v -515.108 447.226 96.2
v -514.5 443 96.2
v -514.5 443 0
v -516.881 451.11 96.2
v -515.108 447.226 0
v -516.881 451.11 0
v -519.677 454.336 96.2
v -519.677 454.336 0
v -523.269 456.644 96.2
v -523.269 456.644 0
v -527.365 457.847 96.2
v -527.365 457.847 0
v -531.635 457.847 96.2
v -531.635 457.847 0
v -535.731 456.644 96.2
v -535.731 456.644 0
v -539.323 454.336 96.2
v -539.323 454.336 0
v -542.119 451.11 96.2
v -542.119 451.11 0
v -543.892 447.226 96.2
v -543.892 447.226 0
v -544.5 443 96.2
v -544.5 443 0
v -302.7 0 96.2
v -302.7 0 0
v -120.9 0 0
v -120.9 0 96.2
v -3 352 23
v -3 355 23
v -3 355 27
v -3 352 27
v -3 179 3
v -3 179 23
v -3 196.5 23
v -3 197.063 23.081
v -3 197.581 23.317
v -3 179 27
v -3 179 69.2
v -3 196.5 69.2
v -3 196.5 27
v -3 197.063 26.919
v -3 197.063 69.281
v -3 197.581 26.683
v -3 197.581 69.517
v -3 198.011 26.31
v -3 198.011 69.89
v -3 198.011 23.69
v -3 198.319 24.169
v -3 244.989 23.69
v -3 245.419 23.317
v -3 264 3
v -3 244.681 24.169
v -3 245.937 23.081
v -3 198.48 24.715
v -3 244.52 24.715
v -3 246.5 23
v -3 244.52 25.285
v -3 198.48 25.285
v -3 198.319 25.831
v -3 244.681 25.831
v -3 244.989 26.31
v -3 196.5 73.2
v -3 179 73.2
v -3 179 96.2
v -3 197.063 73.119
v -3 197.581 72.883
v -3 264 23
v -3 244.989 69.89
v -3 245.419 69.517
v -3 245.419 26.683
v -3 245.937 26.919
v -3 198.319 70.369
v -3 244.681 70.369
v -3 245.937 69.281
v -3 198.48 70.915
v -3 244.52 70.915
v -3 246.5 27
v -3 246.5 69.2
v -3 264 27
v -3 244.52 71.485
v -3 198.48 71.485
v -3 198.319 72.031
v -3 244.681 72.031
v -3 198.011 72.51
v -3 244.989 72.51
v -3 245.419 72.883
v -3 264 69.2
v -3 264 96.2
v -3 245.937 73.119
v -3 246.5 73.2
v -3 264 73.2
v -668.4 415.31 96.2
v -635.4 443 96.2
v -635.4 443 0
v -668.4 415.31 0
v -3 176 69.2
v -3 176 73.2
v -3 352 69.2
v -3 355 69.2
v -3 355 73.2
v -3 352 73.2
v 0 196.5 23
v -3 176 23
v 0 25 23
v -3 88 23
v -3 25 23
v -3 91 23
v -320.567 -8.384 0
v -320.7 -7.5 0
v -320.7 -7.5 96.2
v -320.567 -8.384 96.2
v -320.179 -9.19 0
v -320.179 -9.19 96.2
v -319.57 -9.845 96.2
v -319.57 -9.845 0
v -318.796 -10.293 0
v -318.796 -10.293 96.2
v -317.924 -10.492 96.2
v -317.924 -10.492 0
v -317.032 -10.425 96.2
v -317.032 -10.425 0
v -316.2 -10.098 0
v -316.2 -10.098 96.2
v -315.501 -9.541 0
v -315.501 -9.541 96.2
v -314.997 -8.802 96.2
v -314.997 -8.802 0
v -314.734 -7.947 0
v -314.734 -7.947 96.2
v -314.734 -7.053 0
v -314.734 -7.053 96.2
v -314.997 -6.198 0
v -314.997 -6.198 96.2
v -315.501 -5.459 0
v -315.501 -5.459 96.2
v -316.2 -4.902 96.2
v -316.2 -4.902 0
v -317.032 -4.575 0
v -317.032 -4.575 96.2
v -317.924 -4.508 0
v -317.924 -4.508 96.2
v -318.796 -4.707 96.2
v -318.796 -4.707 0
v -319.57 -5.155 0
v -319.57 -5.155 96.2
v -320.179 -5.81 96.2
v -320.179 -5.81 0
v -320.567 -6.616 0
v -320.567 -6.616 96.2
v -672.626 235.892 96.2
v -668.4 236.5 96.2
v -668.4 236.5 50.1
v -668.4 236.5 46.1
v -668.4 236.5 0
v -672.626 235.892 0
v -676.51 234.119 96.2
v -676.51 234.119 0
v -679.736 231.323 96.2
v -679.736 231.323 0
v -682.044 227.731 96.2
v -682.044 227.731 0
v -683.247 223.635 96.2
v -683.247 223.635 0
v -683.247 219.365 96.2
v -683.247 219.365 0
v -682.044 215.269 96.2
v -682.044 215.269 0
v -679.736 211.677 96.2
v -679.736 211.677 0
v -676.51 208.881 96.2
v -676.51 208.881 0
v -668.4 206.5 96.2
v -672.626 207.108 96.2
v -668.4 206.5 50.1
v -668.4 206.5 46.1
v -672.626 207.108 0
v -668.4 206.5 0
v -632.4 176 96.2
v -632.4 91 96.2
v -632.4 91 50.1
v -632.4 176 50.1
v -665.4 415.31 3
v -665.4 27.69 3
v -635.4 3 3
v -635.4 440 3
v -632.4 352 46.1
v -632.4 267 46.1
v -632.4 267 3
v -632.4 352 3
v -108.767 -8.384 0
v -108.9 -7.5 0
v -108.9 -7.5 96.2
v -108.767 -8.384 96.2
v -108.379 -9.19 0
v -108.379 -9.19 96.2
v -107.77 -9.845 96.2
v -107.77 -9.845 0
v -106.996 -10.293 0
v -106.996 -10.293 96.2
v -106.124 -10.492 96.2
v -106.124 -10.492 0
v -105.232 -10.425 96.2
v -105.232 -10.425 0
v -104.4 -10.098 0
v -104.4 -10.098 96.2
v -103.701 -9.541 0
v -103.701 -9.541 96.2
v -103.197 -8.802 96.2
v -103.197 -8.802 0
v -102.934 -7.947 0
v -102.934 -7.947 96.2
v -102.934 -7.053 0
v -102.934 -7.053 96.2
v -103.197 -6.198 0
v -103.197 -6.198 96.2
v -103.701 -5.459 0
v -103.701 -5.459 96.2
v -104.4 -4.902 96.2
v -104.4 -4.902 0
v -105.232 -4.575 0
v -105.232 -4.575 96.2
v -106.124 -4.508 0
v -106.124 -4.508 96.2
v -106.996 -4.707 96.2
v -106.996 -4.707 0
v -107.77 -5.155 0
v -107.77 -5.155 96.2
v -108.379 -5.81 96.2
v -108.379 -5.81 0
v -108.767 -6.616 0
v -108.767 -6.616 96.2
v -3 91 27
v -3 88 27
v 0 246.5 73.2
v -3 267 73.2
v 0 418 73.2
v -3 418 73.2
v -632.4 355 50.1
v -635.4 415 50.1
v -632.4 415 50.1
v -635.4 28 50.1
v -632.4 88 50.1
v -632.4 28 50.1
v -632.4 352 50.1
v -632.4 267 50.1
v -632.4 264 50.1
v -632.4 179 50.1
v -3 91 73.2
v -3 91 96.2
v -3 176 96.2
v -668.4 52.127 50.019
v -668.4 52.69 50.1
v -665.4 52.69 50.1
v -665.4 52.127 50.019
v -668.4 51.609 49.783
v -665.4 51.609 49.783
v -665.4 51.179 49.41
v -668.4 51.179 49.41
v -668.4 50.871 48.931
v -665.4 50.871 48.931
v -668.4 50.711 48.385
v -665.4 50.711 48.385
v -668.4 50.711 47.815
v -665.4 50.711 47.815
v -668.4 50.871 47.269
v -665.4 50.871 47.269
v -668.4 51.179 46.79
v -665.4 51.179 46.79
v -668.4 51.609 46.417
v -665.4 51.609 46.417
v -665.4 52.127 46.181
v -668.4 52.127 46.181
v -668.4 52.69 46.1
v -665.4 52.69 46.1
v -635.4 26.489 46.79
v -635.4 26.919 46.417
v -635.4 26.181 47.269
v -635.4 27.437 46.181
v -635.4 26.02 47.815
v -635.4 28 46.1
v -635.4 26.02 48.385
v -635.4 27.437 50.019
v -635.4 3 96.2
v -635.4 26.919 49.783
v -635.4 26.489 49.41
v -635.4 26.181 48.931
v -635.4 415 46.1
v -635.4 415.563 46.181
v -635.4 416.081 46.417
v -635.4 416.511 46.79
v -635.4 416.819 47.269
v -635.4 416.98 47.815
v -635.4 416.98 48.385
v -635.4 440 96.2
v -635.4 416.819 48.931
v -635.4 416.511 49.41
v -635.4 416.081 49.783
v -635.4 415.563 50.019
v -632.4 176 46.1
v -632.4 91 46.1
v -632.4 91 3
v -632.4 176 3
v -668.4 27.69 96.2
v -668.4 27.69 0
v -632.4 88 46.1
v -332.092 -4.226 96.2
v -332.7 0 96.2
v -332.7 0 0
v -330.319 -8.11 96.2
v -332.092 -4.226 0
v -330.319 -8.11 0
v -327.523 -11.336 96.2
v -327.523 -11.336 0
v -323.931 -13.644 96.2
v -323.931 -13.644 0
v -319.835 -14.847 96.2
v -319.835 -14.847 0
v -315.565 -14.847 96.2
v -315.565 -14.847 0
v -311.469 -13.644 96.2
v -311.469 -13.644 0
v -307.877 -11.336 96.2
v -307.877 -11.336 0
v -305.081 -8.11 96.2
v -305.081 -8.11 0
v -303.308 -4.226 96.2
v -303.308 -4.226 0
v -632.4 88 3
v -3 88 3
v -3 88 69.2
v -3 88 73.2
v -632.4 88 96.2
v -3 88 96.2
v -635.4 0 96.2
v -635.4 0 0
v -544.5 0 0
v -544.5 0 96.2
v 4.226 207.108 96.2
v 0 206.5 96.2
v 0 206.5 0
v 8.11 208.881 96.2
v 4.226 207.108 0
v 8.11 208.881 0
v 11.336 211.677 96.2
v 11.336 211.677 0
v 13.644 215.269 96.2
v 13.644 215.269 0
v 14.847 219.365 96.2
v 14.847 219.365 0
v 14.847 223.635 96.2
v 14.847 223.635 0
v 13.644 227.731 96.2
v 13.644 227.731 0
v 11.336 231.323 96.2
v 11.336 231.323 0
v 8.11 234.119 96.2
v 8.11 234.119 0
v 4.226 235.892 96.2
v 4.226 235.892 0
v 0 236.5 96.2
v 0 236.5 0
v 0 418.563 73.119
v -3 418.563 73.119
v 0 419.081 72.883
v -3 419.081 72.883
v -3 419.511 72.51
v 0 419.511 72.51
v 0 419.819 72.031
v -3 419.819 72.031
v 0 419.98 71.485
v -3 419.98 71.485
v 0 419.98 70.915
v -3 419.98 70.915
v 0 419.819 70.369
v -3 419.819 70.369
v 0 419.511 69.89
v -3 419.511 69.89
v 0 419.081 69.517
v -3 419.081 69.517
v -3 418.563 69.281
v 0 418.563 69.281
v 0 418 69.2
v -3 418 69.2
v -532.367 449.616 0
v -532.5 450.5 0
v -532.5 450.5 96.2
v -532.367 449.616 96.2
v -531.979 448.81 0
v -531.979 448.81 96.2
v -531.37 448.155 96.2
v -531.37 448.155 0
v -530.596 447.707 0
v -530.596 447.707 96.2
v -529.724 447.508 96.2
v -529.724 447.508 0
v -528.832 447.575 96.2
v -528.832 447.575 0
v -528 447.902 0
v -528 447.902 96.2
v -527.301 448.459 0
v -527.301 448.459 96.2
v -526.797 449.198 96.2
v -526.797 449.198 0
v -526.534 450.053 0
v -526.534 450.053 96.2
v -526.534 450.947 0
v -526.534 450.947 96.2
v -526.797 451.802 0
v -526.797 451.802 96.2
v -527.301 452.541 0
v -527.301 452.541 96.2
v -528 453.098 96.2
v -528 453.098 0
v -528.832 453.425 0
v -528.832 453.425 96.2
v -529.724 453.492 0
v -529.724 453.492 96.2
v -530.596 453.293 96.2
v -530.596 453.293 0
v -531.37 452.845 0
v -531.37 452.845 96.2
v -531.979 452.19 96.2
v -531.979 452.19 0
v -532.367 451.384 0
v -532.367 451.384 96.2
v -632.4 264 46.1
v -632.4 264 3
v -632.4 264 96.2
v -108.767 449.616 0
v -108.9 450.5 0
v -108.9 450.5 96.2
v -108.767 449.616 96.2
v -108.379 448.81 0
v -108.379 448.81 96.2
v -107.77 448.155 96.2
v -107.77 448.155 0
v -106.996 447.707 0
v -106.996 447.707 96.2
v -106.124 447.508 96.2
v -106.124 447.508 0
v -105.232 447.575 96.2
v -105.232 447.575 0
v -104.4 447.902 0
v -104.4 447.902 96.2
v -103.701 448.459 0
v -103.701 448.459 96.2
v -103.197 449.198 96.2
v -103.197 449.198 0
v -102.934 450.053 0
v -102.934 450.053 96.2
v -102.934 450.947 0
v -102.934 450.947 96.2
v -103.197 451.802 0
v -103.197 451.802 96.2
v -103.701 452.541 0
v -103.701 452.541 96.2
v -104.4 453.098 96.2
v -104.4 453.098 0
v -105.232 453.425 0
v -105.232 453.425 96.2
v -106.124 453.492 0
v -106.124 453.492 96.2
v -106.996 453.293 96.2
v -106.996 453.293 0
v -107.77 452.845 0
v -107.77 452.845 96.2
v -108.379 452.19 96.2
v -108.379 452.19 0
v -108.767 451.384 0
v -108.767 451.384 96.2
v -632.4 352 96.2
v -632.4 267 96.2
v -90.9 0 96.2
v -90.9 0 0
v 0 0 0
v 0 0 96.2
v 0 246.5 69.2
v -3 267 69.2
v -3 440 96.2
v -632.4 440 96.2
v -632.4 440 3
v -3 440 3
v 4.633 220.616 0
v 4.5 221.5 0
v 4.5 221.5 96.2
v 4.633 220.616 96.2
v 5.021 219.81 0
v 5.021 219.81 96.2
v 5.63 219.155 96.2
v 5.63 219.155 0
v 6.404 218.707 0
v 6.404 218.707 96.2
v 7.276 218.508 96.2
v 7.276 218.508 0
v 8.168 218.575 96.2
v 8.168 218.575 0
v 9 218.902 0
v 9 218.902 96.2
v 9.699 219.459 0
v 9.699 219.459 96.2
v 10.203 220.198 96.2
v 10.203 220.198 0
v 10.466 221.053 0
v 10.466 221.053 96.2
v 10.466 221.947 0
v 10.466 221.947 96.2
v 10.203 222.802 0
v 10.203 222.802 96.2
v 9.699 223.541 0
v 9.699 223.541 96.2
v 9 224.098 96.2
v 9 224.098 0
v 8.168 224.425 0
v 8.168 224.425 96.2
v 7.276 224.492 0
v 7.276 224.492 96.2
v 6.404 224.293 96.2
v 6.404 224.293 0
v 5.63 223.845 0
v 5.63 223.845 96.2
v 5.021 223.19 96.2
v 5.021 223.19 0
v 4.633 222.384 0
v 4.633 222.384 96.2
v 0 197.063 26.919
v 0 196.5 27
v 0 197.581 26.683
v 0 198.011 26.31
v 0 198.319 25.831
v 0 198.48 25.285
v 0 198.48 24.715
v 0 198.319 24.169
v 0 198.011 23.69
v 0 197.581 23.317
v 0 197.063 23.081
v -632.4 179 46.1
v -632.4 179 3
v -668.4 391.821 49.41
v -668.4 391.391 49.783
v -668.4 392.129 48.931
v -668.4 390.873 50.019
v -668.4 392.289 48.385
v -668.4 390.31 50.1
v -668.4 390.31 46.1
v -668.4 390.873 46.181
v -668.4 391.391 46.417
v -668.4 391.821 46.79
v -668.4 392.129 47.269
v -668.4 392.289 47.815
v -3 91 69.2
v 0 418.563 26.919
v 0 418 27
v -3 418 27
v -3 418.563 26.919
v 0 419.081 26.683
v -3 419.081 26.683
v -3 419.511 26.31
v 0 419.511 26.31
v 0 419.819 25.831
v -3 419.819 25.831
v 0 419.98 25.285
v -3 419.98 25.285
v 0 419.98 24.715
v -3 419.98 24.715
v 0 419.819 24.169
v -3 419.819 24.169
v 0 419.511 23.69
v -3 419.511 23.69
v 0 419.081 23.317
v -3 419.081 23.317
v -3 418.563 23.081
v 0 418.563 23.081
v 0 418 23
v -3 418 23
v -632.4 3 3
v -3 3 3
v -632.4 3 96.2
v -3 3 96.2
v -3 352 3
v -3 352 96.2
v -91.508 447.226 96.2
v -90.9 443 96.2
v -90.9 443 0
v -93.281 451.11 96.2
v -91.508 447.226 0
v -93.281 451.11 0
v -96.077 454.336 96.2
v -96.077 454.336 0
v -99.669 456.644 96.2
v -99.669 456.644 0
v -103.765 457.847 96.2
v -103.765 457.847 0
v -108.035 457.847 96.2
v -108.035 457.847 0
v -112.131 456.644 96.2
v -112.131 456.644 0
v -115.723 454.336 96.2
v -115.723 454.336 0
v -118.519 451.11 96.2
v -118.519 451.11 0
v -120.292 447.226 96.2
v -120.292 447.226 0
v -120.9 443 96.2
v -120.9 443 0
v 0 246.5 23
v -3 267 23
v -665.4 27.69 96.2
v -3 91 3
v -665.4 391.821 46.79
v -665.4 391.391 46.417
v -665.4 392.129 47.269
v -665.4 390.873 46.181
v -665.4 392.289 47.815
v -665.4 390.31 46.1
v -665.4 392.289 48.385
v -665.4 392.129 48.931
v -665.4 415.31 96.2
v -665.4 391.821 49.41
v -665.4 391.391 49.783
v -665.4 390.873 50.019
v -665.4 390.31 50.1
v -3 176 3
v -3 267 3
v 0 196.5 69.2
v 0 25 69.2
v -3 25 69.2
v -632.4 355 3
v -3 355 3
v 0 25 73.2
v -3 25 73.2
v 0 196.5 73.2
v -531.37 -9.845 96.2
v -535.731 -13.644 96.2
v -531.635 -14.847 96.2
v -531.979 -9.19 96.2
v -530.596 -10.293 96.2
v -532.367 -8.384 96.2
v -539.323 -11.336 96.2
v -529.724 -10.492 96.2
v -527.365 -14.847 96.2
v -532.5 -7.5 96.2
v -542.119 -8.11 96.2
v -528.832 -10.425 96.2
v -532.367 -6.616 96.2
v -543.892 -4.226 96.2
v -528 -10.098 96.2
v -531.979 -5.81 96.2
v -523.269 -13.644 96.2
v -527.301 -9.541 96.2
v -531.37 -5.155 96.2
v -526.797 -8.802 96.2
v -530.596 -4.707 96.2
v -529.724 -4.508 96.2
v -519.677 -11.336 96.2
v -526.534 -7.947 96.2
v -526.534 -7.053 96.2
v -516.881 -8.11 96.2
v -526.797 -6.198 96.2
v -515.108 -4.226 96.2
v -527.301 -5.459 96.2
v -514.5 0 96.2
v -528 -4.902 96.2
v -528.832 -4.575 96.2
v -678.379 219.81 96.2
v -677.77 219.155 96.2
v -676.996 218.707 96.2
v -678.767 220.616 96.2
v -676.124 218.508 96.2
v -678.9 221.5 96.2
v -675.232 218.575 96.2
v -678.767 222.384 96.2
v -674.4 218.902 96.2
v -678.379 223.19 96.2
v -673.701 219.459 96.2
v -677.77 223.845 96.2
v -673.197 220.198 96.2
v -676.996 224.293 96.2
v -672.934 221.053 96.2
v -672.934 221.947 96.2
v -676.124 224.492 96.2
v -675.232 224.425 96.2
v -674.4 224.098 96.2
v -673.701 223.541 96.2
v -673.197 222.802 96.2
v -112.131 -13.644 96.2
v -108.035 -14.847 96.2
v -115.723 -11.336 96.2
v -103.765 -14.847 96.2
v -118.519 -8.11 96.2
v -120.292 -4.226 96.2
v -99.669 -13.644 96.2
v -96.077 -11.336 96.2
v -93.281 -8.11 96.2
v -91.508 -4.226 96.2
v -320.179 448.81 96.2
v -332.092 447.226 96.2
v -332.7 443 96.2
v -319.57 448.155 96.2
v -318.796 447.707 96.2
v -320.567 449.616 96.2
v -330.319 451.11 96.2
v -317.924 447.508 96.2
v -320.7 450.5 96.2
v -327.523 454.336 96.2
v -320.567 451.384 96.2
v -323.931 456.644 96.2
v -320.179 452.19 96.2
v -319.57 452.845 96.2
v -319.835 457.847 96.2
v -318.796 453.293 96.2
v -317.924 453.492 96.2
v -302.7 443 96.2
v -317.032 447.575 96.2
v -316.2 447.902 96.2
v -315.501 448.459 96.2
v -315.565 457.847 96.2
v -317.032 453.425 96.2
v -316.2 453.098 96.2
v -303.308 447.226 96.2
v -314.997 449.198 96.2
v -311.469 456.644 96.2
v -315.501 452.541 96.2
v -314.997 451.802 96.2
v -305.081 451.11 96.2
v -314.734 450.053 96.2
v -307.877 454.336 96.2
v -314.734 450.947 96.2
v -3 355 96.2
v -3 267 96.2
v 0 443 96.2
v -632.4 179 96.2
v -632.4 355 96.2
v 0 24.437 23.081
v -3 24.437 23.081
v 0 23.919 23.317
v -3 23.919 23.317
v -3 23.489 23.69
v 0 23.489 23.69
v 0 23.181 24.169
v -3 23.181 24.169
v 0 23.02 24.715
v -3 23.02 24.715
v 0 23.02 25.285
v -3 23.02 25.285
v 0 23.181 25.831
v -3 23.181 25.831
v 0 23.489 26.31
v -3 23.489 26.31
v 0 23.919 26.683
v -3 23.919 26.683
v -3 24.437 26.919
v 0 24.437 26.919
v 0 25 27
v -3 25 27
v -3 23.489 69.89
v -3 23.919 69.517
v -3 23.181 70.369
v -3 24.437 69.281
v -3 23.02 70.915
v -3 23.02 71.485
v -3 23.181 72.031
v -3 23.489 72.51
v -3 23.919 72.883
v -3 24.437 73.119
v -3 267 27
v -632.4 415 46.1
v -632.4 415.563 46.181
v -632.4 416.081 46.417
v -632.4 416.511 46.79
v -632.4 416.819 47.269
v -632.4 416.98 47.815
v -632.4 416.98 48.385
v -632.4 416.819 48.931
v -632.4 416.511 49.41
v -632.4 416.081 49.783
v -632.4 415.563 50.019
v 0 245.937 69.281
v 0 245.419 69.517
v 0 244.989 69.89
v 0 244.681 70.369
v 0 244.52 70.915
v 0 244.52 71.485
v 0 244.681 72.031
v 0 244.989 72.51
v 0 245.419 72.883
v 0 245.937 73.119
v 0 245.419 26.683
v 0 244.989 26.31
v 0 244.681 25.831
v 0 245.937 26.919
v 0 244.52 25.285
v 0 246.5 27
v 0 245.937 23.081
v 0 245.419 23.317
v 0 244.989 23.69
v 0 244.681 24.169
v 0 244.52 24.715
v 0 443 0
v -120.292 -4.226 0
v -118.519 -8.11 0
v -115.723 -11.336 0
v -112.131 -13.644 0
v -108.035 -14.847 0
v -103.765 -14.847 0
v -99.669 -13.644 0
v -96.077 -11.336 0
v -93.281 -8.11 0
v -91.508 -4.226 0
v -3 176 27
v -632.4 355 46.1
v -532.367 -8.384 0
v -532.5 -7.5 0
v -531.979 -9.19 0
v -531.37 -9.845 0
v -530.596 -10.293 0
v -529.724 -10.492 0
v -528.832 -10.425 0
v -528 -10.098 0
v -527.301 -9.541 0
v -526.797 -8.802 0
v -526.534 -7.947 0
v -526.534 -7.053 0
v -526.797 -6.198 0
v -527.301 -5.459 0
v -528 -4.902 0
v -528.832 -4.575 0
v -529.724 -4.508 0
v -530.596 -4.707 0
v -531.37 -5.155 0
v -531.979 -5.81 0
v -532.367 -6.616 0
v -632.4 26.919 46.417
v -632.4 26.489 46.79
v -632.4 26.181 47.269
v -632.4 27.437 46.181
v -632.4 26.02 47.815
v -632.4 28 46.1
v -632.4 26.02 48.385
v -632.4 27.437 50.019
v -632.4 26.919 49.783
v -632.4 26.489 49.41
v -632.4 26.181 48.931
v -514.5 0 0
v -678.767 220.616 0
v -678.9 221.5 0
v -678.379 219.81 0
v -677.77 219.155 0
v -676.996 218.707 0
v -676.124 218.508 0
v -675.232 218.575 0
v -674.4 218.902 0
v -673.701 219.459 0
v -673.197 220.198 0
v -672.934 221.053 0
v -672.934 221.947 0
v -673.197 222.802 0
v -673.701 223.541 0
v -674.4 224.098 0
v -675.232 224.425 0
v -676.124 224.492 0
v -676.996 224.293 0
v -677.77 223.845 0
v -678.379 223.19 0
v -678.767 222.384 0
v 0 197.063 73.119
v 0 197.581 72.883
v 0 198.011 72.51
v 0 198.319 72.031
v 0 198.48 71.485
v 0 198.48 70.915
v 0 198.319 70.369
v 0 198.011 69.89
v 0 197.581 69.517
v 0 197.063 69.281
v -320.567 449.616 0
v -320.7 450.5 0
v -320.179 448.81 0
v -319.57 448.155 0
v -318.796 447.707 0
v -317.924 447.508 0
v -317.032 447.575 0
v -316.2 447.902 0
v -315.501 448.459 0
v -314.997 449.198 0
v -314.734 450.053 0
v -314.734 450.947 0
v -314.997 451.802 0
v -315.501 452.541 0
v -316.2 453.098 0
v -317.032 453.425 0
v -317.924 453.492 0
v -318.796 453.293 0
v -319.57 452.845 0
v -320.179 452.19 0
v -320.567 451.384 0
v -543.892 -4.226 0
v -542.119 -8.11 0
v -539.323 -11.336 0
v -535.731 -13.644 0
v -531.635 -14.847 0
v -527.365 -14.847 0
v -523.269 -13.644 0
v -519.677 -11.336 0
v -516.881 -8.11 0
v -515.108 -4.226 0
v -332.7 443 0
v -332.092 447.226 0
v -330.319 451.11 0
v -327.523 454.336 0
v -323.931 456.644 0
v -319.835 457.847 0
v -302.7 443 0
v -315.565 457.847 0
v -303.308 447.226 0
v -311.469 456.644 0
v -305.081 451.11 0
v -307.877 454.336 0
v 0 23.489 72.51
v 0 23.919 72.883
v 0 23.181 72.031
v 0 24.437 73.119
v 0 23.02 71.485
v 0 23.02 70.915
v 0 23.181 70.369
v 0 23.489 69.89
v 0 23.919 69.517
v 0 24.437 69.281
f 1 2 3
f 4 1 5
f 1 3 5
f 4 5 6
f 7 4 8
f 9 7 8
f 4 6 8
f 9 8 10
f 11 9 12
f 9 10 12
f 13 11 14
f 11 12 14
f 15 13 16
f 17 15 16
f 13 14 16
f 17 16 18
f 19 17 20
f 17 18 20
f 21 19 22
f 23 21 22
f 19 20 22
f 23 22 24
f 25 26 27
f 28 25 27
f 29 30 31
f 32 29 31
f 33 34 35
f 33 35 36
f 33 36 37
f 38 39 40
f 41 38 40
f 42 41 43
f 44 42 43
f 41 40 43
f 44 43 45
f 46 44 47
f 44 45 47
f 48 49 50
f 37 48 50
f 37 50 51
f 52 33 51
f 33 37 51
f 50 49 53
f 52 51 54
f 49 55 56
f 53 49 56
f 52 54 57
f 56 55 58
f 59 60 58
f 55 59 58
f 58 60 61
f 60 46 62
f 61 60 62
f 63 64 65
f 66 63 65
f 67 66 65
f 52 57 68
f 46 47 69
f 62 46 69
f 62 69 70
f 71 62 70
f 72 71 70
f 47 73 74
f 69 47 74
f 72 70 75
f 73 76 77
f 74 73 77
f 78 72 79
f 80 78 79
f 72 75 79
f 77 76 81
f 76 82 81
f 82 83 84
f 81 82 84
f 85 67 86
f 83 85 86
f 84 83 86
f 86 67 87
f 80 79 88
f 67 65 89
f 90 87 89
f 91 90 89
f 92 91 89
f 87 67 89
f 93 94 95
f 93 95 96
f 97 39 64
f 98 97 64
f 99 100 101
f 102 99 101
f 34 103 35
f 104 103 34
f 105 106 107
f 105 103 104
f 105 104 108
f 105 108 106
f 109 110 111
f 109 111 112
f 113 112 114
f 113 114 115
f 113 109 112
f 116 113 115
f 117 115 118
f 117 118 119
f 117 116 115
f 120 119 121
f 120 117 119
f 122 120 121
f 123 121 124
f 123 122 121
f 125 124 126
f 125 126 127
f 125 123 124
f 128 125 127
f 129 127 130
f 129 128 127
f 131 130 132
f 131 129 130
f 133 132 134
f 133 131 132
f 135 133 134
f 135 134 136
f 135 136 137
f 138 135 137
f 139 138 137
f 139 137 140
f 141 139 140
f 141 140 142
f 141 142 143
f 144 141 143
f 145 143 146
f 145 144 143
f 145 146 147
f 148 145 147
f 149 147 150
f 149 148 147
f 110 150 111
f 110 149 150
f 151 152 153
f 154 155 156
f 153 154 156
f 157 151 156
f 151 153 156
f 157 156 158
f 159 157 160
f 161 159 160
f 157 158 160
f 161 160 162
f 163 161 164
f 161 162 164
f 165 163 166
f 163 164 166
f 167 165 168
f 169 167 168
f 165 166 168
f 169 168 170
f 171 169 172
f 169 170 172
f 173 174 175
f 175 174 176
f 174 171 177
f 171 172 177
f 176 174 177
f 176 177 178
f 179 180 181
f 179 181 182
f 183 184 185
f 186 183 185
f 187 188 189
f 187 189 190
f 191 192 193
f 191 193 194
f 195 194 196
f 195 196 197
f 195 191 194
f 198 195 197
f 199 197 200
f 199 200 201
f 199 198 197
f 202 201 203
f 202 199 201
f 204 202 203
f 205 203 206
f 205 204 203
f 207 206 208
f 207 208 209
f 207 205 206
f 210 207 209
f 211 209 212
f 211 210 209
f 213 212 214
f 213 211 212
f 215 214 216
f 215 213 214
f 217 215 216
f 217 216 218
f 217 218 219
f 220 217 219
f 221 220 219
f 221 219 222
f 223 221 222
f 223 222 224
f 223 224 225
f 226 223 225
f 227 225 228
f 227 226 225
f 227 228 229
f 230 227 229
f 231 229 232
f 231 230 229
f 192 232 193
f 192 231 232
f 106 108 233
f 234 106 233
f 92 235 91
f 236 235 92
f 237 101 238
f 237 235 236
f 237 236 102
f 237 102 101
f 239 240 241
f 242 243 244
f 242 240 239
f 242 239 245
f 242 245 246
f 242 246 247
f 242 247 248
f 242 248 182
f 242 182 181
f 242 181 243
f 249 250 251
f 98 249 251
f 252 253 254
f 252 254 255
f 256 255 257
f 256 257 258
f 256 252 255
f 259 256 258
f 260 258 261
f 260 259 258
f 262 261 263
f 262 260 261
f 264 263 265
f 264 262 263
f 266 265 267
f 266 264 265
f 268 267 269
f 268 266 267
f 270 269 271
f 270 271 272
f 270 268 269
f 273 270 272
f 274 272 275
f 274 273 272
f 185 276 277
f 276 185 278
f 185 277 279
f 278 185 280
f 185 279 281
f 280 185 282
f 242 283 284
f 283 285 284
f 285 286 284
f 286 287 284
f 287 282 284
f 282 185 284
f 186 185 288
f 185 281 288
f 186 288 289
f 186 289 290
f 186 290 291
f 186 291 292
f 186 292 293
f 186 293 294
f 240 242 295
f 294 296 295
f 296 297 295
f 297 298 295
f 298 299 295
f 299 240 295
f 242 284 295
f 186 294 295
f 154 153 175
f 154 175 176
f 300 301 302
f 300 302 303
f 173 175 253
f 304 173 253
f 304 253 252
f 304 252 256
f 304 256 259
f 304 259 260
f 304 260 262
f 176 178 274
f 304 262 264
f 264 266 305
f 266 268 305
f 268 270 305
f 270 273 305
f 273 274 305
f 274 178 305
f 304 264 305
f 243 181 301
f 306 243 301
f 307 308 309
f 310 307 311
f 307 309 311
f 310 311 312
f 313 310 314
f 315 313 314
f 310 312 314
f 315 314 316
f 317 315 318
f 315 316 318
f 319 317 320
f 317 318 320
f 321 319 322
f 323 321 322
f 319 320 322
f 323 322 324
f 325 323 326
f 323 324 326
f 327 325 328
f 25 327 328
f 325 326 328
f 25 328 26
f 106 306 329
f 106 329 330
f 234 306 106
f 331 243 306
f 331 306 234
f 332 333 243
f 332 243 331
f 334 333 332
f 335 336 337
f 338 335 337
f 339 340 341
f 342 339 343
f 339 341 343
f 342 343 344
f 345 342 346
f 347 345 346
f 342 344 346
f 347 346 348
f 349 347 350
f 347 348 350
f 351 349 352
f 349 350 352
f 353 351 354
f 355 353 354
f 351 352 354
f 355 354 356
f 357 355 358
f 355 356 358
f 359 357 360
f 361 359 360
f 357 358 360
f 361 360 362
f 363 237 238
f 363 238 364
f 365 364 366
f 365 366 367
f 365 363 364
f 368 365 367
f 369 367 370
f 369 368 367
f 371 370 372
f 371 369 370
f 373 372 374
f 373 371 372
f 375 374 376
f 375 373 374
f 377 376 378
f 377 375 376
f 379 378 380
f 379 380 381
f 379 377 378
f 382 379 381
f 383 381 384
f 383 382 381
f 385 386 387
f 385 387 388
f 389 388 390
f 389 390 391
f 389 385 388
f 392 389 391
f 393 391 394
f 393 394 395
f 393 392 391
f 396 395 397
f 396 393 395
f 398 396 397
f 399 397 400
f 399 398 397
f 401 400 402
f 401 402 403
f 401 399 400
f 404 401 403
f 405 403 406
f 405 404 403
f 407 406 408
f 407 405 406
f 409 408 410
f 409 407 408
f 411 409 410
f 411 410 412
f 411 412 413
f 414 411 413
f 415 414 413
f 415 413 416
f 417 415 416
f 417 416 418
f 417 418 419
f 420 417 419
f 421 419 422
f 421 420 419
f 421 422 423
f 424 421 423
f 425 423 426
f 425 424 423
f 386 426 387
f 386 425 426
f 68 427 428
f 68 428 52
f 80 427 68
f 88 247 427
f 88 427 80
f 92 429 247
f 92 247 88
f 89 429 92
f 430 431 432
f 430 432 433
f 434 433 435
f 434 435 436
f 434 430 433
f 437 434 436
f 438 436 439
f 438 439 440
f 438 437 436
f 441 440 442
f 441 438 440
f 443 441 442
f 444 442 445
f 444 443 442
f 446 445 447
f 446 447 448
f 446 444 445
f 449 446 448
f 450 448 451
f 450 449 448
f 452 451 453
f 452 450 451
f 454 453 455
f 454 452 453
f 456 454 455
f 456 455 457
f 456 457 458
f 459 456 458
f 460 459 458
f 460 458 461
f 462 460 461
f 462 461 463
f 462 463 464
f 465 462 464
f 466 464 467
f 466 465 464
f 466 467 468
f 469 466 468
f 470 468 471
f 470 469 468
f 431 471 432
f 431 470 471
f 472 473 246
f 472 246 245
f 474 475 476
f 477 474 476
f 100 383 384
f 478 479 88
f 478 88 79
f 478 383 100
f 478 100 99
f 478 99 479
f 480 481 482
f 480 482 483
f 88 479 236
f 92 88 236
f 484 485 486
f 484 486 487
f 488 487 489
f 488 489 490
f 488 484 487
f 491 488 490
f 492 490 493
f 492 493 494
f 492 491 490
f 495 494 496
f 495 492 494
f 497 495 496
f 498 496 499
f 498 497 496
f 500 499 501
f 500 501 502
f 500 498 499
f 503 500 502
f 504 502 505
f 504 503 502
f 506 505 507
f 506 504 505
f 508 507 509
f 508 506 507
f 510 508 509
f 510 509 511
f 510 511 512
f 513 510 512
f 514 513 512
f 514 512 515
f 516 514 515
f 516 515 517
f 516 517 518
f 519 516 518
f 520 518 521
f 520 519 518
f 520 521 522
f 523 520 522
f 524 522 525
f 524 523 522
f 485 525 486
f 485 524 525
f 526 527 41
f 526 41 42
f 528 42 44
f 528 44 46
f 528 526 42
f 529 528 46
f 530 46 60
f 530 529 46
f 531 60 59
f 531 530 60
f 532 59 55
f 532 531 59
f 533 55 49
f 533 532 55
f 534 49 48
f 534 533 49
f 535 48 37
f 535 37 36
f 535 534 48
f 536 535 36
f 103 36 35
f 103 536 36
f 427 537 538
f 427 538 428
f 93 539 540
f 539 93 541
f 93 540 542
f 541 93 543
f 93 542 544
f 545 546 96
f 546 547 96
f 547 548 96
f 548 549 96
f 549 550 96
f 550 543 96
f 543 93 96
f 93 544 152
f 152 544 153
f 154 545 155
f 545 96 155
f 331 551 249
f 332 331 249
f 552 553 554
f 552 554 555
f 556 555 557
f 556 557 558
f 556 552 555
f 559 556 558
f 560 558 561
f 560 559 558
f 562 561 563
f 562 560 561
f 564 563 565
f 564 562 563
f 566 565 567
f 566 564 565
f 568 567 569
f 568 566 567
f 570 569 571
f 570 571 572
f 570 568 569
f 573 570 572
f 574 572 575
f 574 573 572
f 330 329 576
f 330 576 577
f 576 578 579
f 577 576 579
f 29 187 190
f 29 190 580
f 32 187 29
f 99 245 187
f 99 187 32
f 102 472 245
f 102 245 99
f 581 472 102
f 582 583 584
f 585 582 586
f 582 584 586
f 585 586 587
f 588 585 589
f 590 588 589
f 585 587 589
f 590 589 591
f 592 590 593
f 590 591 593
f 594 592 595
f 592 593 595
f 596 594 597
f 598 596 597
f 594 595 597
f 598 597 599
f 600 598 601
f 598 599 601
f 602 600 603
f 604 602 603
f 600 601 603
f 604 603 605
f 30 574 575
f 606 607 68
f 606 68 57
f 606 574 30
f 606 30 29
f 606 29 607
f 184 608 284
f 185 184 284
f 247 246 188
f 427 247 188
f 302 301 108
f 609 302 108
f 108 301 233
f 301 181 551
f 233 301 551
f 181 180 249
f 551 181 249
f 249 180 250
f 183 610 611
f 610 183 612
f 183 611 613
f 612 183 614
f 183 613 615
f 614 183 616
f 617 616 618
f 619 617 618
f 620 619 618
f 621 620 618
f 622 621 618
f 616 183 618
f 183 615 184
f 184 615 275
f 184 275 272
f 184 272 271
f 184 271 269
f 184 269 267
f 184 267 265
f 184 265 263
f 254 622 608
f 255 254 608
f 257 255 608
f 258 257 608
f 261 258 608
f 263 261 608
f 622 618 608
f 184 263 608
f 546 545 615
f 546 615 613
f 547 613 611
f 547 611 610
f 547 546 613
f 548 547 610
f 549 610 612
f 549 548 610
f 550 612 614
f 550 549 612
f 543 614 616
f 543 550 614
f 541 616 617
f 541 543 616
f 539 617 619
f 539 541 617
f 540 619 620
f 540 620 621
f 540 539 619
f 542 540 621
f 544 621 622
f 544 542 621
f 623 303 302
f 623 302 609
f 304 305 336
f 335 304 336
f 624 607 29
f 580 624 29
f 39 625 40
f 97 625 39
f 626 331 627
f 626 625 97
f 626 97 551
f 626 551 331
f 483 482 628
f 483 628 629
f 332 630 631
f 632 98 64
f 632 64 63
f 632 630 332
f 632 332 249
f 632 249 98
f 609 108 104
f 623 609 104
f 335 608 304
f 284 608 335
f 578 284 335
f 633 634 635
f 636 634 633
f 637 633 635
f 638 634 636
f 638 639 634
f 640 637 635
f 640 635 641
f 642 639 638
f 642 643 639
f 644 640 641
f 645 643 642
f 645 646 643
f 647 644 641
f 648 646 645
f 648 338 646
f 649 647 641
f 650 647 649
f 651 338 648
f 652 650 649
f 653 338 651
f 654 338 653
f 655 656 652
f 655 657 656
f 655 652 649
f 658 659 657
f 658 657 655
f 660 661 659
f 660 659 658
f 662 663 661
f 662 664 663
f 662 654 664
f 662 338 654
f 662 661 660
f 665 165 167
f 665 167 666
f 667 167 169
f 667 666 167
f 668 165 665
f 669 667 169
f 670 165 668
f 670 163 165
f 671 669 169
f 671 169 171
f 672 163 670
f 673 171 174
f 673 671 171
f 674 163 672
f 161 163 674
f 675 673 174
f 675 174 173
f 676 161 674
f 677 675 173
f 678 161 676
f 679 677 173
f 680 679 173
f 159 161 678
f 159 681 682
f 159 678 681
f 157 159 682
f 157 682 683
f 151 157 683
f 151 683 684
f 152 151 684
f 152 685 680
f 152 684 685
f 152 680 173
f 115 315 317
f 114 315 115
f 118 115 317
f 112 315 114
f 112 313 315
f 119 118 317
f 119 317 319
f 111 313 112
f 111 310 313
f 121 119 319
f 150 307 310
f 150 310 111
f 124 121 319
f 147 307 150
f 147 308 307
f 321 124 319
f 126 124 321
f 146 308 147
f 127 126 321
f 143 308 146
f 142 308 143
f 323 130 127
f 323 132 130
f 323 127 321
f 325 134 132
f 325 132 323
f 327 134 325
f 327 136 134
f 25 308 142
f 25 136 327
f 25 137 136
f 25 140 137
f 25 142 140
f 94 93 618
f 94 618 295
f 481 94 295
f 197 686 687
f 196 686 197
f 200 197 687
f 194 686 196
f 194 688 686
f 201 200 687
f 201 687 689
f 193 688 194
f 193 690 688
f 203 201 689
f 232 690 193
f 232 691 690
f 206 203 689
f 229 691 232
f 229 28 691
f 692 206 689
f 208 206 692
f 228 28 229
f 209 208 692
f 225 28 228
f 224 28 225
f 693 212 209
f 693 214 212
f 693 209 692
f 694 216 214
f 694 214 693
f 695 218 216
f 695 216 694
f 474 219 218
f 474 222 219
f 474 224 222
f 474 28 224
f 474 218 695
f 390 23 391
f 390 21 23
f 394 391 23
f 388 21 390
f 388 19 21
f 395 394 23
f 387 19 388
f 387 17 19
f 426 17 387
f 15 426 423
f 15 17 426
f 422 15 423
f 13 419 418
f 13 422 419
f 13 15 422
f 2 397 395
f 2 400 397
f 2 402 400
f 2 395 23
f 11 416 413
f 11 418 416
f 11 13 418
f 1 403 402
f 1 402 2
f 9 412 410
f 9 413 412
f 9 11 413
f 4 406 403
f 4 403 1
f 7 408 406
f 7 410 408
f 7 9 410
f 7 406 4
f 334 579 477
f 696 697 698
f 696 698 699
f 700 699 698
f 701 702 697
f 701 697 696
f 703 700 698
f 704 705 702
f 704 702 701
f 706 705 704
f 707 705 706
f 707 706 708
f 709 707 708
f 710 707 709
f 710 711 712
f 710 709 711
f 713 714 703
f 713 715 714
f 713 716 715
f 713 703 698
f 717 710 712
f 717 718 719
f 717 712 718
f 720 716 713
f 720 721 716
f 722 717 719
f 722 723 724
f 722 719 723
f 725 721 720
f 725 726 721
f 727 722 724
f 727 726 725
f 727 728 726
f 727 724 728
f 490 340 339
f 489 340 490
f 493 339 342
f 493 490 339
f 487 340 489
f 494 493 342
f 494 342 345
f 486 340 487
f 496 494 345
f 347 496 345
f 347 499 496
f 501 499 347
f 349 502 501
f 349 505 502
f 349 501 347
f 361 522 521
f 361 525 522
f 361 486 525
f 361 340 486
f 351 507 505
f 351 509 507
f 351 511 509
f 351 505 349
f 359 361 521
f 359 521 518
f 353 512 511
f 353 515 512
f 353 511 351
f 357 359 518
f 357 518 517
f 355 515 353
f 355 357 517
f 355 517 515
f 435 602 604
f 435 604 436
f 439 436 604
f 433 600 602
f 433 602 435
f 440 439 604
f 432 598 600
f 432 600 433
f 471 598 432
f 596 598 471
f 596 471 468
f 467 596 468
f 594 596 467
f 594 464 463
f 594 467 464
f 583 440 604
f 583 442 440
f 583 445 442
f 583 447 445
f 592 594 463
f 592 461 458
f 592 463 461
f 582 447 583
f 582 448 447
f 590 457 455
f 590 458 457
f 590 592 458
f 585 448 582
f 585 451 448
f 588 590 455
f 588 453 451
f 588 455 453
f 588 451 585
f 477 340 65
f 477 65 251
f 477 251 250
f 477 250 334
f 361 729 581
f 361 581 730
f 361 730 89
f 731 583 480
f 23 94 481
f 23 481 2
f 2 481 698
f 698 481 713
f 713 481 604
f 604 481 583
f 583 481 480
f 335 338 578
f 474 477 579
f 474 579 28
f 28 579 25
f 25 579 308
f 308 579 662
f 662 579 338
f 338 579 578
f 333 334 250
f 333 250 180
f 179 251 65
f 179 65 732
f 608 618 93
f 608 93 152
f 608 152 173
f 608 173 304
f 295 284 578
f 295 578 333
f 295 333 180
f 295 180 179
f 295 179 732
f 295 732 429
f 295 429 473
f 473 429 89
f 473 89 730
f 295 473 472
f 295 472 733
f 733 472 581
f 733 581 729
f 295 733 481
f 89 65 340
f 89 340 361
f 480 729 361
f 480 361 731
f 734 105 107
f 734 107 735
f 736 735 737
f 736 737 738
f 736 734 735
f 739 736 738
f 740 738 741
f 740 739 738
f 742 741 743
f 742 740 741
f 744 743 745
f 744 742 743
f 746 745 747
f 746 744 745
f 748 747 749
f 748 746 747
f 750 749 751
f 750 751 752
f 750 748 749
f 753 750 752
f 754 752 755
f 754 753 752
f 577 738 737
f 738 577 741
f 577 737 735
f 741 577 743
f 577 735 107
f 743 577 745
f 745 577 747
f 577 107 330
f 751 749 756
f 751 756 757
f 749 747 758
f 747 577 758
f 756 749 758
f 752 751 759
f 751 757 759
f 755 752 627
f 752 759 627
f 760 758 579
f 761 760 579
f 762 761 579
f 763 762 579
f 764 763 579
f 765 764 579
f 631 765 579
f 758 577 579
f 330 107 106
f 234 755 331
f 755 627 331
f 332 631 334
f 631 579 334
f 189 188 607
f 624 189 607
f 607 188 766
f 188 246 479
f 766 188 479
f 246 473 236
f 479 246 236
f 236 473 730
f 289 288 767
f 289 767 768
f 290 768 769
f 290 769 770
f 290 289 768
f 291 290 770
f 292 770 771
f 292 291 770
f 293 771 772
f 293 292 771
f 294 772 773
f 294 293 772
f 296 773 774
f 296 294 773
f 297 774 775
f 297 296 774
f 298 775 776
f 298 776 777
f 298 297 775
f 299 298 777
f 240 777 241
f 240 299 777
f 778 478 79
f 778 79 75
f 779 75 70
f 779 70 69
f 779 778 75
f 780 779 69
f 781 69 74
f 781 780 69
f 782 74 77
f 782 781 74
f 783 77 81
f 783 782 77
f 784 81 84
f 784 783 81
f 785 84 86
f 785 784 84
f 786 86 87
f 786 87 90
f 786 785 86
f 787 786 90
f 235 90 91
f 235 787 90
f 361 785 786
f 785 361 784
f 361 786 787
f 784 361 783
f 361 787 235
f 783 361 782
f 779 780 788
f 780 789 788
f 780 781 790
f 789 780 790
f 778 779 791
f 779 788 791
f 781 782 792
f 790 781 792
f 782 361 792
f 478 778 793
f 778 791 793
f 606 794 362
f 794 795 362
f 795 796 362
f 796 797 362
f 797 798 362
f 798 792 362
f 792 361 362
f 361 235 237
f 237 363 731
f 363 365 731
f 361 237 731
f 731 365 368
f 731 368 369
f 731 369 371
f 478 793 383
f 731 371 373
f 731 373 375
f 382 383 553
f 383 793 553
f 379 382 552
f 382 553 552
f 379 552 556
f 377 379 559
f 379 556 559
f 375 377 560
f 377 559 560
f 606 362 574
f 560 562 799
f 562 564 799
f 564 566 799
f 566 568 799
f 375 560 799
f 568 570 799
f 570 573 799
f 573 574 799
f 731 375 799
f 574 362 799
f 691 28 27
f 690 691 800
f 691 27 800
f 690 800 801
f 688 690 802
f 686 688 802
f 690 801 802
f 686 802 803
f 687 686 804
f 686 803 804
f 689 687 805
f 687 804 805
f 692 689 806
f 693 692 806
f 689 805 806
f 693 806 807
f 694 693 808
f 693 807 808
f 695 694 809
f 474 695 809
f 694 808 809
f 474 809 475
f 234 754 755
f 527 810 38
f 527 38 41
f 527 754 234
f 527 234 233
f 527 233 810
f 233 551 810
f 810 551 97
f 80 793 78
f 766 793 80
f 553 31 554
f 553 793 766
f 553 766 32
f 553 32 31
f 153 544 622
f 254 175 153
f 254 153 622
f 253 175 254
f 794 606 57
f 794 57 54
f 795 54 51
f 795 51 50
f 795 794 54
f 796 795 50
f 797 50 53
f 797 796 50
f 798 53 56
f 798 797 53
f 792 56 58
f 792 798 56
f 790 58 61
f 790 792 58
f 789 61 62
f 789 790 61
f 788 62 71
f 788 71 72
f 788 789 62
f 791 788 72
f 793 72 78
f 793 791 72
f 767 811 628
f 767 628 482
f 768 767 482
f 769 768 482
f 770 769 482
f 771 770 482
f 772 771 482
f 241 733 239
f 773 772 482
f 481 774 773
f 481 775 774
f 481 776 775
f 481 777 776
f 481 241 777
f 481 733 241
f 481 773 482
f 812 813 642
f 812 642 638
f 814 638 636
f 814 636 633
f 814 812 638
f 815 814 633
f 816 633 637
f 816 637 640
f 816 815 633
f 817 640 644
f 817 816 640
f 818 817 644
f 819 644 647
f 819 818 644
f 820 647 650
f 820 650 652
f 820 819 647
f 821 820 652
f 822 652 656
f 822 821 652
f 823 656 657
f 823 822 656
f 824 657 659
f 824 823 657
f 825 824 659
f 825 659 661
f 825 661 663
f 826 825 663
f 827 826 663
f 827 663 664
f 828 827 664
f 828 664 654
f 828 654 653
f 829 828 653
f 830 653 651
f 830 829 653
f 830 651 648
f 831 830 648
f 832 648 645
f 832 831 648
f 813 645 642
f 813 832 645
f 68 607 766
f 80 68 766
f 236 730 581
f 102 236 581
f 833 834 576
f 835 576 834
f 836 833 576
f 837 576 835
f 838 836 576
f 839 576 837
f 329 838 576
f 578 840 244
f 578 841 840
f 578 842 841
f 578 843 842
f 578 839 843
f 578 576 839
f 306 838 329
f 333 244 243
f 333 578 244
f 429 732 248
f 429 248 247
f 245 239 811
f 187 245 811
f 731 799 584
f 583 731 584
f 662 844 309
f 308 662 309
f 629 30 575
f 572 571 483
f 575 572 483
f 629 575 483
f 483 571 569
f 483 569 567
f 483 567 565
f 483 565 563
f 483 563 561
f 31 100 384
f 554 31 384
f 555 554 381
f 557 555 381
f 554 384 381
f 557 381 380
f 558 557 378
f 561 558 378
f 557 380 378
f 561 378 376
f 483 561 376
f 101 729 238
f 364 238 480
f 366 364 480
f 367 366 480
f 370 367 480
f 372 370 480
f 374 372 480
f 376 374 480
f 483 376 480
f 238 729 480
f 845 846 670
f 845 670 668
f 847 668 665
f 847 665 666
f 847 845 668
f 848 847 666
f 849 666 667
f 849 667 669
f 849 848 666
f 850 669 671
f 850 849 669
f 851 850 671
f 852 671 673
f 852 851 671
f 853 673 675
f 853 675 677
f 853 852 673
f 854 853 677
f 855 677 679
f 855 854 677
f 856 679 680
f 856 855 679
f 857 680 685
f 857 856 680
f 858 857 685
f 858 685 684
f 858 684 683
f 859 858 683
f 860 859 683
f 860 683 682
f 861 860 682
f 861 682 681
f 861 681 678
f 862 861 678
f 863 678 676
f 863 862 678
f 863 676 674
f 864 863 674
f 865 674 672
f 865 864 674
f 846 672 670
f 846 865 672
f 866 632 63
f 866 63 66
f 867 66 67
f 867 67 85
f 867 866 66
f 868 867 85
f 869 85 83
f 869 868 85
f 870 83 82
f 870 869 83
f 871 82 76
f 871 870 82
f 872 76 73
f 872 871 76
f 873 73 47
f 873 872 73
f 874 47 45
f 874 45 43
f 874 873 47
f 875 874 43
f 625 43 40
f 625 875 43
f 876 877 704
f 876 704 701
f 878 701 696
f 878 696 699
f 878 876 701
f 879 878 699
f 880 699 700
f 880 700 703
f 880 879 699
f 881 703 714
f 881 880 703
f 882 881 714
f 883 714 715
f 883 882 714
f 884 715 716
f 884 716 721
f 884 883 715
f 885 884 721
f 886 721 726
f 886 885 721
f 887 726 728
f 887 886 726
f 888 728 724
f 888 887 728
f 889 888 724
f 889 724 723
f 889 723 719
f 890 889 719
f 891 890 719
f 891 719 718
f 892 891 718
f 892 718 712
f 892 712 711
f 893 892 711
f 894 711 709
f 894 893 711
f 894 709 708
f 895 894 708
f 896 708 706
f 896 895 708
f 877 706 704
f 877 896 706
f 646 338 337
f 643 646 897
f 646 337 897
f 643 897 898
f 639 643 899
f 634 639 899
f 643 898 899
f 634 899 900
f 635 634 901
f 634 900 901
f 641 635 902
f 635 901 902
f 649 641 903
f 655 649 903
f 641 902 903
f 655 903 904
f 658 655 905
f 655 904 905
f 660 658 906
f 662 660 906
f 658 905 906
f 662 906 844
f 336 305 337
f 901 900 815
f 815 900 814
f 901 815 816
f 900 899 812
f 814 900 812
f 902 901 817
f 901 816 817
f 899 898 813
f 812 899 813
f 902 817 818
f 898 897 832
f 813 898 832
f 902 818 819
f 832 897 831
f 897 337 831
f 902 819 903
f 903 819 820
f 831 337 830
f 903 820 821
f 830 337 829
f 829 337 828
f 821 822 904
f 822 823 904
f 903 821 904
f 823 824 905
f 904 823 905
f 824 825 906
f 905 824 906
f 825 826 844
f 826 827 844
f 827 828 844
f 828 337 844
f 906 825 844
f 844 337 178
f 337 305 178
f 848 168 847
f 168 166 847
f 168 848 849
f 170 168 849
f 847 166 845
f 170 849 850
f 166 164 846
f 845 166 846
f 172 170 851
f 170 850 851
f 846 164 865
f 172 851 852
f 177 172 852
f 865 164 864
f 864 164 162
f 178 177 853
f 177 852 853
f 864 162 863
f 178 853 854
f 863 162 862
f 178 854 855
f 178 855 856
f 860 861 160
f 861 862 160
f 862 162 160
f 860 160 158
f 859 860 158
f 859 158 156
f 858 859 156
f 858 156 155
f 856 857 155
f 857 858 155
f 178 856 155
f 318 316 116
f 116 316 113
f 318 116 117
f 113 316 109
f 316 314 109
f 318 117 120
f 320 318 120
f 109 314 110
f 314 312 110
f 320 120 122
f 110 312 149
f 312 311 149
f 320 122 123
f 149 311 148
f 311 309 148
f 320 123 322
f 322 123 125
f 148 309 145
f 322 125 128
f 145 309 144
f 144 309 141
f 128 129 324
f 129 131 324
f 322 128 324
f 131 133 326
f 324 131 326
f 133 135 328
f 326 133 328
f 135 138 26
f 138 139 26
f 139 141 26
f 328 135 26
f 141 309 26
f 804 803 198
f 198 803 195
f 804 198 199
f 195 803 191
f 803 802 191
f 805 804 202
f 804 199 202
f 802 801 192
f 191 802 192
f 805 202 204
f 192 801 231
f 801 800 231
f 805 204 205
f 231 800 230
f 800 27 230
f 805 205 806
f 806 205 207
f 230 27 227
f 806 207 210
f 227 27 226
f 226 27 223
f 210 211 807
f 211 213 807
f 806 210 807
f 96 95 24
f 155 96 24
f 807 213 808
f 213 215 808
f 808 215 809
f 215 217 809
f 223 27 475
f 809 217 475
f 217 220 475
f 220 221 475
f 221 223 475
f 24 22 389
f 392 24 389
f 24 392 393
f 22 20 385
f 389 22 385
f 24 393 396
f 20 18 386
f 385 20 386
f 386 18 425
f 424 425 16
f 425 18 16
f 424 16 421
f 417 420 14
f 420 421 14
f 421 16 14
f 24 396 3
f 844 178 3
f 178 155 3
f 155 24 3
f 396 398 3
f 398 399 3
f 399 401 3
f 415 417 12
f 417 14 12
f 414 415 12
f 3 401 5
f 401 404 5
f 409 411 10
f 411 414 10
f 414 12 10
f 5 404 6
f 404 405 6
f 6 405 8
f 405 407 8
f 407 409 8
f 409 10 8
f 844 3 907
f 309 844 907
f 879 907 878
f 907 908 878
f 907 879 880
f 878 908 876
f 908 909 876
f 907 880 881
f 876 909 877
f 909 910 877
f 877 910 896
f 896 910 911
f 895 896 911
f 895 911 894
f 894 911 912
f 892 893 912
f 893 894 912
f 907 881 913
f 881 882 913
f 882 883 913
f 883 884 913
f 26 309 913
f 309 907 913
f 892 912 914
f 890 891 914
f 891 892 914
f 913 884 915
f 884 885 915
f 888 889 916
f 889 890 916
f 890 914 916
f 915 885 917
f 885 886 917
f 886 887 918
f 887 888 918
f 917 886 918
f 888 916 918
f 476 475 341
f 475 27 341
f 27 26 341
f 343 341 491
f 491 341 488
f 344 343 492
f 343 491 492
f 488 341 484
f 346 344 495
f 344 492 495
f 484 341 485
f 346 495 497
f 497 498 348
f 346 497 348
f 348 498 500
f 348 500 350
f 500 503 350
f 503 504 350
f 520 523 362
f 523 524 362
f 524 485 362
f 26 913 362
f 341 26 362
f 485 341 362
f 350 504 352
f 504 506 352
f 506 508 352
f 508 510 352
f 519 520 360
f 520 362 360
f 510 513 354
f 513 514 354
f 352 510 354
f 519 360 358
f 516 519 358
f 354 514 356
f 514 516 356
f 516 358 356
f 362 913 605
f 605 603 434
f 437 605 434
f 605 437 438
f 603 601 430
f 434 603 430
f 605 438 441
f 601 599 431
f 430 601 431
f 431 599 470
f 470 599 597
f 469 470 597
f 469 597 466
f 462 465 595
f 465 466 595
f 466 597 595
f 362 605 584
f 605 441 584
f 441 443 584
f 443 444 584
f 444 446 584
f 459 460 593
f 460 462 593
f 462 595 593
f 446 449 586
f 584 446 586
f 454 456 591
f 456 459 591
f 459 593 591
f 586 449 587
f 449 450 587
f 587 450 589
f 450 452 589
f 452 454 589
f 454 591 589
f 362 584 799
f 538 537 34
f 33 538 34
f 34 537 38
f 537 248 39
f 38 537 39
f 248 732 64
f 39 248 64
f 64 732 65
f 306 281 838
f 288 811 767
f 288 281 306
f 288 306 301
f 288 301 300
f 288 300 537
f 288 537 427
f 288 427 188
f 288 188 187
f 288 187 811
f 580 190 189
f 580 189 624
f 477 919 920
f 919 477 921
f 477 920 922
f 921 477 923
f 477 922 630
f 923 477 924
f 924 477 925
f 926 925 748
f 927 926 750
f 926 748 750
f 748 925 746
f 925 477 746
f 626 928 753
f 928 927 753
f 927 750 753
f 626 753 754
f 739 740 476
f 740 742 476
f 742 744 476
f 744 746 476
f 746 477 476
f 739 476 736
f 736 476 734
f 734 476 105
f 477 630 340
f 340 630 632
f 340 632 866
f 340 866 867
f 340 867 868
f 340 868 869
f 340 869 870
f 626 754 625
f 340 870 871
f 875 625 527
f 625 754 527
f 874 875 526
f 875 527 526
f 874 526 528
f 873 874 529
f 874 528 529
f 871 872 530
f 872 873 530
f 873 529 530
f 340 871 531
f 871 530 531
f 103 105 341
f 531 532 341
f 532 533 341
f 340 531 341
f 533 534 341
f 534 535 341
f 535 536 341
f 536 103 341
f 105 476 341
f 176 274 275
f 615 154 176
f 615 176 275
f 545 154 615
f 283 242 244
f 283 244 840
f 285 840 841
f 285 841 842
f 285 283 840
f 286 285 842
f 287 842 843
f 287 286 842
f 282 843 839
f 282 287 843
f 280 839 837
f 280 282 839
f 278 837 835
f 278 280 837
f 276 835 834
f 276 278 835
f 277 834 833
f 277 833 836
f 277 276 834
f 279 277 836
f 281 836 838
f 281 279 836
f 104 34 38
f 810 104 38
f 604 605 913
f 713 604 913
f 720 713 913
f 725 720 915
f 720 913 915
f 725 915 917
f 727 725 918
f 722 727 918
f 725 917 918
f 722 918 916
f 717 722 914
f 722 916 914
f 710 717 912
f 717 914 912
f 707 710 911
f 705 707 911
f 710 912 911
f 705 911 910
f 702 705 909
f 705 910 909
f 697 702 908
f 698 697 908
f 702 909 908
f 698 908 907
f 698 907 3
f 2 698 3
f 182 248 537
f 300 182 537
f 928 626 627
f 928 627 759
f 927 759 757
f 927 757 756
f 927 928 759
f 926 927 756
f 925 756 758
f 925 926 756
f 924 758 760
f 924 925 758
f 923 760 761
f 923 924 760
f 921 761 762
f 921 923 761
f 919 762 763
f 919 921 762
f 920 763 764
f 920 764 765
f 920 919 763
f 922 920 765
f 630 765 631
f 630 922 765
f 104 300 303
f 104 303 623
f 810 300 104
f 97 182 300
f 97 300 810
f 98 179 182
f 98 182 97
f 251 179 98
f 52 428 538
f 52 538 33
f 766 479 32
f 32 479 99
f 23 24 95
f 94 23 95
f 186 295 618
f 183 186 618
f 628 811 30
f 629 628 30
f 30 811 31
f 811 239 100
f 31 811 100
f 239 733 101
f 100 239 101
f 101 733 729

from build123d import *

# Parameters (mm, degrees)
SKETCH1_R           = 3
BOSS_EXTRUDE1_DEPTH = 96.2
SKETCH2_W           = 629.4
SKETCH2_H           = 85
CUT_EXTRUDE1_DEPTH  = 93.2
LPATTERN1_COUNT     = 5
LPATTERN1_PITCH     = 88
CUT_EXTRUDE3_DEPTH  = 93.2
CUT_EXTRUDE4_DEPTH  = 3
CUT_EXTRUDE5_DEPTH  = 3
CUT_EXTRUDE6_DEPTH  = 3


with BuildPart() as part:
    # Sketch1 → Boss-Extrude1 (new body)
    with BuildSketch(Plane.XY):
        with BuildLine():
            Line((0, 0), (0, 206.5))
            ThreePointArc((0, 206.5), (15, 221.5), (0, 236.5))
            Line((0, 236.5), (0, 443))
            Line((0, 443), (-90.9, 443))
            ThreePointArc((-90.9, 443), (-105.9, 458), (-120.9, 443))
            Line((-120.9, 443), (-302.7, 443))
            ThreePointArc((-302.7, 443), (-317.7, 458), (-332.7, 443))
            Line((-332.7, 443), (-514.5, 443))
            ThreePointArc((-514.5, 443), (-529.5, 458), (-544.5, 443))
            Line((-544.5, 443), (-635.4, 443))
            Line((-635.4, 443), (-668.4, 415.309712171))
            Line((-668.4, 415.309712171), (-668.4, 236.5))
            ThreePointArc((-668.4, 236.5), (-683.4, 221.5), (-668.4, 206.5))
            Line((-668.4, 206.5), (-668.4, 27.690287829))
            Line((-668.4, 27.690287829), (-635.4, 0))
            Line((-635.4, 0), (-544.5, 0))
            ThreePointArc((-544.5, 0), (-529.5, -15), (-514.5, 0))
            Line((-514.5, 0), (-332.7, 0))
            ThreePointArc((-332.7, 0), (-317.7, -15), (-302.7, 0))
            Line((-302.7, 0), (-120.9, 0))
            ThreePointArc((-120.9, 0), (-105.9, -15), (-90.9, 0))
            Line((-90.9, 0), (0, 0))
        make_face()
        with Locations(Location((-529.5, 450.5, 0), (0, 0, 180))):
            Circle(SKETCH1_R, mode=Mode.SUBTRACT)
        with Locations(Location((-317.7, 450.5, 0), (0, 0, 180))):
            Circle(SKETCH1_R, mode=Mode.SUBTRACT)
        with Locations(Location((-105.9, 450.5, 0), (0, 0, 180))):
            Circle(SKETCH1_R, mode=Mode.SUBTRACT)
        with Locations(Location((7.5, 221.5, 0), (0, 0, 180))):
            Circle(SKETCH1_R, mode=Mode.SUBTRACT)
        with Locations(Location((-675.9, 221.5, 0), (0, 0, 180))):
            Circle(SKETCH1_R, mode=Mode.SUBTRACT)
        with Locations(Location((-529.5, -7.5, 0), (0, 0, 180))):
            Circle(SKETCH1_R, mode=Mode.SUBTRACT)
        with Locations(Location((-317.7, -7.5, 0), (0, 0, 180))):
            Circle(SKETCH1_R, mode=Mode.SUBTRACT)
        with Locations(Location((-105.9, -7.5, 0), (0, 0, 180))):
            Circle(SKETCH1_R, mode=Mode.SUBTRACT)
    extrude(amount=BOSS_EXTRUDE1_DEPTH)

    # Sketch2 → Cut-Extrude1 (cut)
    with BuildSketch(Plane.XY.offset(96.2)):
        with Locations((-317.7, 397.5)):
            Rectangle(SKETCH2_W, SKETCH2_H)
    cut_extrude1 = extrude(amount=-CUT_EXTRUDE1_DEPTH, mode=Mode.SUBTRACT)

    # LPattern1: Cut-Extrude1 ×5
    with Locations(*[(0, -i * LPATTERN1_PITCH, 0) for i in range(1, LPATTERN1_COUNT)]):
        add(cut_extrude1, mode=Mode.SUBTRACT)

    # Sketch5 → Cut-Extrude3 (cut)
    with BuildSketch(Plane.XY.offset(96.2)):
        Polygon((-665.4, 415.309712171), (-665.4, 27.690287829), (-635.4, 3), (-635.4, 440), align=None)
    extrude(amount=-CUT_EXTRUDE3_DEPTH, mode=Mode.SUBTRACT)

    # Sketch7 → Cut-Extrude4 (cut)
    with BuildSketch(Plane(origin=(0, 0, 0), x_dir=(0, 0, -1), z_dir=(1, 0, 0))):
        with BuildLine():
            Line((-69.2, 418), (-69.2, 246.5))
            ThreePointArc((-69.2, 246.5), (-71.2, 244.5), (-73.2, 246.5))
            Line((-73.2, 246.5), (-73.2, 418))
            ThreePointArc((-73.2, 418), (-71.2, 420), (-69.2, 418))
        make_face()
        with BuildLine():
            Line((-23, 418), (-23, 246.5))
            ThreePointArc((-23, 246.5), (-25, 244.5), (-27, 246.5))
            Line((-27, 246.5), (-27, 418))
            ThreePointArc((-27, 418), (-25, 420), (-23, 418))
        make_face()
        with BuildLine():
            Line((-69.2, 196.5), (-69.2, 25))
            ThreePointArc((-69.2, 25), (-71.2, 23), (-73.2, 25))
            Line((-73.2, 25), (-73.2, 196.5))
            ThreePointArc((-73.2, 196.5), (-71.2, 198.5), (-69.2, 196.5))
        make_face()
        with BuildLine():
            Line((-23, 196.5), (-23, 25))
            ThreePointArc((-23, 25), (-25, 23), (-27, 25))
            Line((-27, 25), (-27, 196.5))
            ThreePointArc((-27, 196.5), (-25, 198.5), (-23, 196.5))
        make_face()
    extrude(amount=-CUT_EXTRUDE4_DEPTH, mode=Mode.SUBTRACT)

    # Sketch8 → Cut-Extrude5 (cut)
    with BuildSketch(Plane.ZY.offset(635.4)):
        with BuildLine():
            Line((50.1, 415), (50.1, 28))
            ThreePointArc((50.1, 28), (48.1, 26), (46.1, 28))
            Line((46.1, 28), (46.1, 415))
            ThreePointArc((46.1, 415), (48.1, 417), (50.1, 415))
        make_face()
    extrude(amount=-CUT_EXTRUDE5_DEPTH, mode=Mode.SUBTRACT)

    # Sketch9 → Cut-Extrude6 (cut)
    with BuildSketch(Plane.ZY.offset(668.4)):
        with BuildLine():
            Line((50.1, 390.309712171), (50.1, 52.690287829))
            ThreePointArc((50.1, 52.690287829), (48.1, 50.690287829), (46.1, 52.690287829))
            Line((46.1, 52.690287829), (46.1, 390.309712171))
            ThreePointArc((46.1, 390.309712171), (48.1, 392.309712171), (50.1, 390.309712171))
        make_face()
    extrude(amount=-CUT_EXTRUDE6_DEPTH, mode=Mode.SUBTRACT)


solid = part.part
